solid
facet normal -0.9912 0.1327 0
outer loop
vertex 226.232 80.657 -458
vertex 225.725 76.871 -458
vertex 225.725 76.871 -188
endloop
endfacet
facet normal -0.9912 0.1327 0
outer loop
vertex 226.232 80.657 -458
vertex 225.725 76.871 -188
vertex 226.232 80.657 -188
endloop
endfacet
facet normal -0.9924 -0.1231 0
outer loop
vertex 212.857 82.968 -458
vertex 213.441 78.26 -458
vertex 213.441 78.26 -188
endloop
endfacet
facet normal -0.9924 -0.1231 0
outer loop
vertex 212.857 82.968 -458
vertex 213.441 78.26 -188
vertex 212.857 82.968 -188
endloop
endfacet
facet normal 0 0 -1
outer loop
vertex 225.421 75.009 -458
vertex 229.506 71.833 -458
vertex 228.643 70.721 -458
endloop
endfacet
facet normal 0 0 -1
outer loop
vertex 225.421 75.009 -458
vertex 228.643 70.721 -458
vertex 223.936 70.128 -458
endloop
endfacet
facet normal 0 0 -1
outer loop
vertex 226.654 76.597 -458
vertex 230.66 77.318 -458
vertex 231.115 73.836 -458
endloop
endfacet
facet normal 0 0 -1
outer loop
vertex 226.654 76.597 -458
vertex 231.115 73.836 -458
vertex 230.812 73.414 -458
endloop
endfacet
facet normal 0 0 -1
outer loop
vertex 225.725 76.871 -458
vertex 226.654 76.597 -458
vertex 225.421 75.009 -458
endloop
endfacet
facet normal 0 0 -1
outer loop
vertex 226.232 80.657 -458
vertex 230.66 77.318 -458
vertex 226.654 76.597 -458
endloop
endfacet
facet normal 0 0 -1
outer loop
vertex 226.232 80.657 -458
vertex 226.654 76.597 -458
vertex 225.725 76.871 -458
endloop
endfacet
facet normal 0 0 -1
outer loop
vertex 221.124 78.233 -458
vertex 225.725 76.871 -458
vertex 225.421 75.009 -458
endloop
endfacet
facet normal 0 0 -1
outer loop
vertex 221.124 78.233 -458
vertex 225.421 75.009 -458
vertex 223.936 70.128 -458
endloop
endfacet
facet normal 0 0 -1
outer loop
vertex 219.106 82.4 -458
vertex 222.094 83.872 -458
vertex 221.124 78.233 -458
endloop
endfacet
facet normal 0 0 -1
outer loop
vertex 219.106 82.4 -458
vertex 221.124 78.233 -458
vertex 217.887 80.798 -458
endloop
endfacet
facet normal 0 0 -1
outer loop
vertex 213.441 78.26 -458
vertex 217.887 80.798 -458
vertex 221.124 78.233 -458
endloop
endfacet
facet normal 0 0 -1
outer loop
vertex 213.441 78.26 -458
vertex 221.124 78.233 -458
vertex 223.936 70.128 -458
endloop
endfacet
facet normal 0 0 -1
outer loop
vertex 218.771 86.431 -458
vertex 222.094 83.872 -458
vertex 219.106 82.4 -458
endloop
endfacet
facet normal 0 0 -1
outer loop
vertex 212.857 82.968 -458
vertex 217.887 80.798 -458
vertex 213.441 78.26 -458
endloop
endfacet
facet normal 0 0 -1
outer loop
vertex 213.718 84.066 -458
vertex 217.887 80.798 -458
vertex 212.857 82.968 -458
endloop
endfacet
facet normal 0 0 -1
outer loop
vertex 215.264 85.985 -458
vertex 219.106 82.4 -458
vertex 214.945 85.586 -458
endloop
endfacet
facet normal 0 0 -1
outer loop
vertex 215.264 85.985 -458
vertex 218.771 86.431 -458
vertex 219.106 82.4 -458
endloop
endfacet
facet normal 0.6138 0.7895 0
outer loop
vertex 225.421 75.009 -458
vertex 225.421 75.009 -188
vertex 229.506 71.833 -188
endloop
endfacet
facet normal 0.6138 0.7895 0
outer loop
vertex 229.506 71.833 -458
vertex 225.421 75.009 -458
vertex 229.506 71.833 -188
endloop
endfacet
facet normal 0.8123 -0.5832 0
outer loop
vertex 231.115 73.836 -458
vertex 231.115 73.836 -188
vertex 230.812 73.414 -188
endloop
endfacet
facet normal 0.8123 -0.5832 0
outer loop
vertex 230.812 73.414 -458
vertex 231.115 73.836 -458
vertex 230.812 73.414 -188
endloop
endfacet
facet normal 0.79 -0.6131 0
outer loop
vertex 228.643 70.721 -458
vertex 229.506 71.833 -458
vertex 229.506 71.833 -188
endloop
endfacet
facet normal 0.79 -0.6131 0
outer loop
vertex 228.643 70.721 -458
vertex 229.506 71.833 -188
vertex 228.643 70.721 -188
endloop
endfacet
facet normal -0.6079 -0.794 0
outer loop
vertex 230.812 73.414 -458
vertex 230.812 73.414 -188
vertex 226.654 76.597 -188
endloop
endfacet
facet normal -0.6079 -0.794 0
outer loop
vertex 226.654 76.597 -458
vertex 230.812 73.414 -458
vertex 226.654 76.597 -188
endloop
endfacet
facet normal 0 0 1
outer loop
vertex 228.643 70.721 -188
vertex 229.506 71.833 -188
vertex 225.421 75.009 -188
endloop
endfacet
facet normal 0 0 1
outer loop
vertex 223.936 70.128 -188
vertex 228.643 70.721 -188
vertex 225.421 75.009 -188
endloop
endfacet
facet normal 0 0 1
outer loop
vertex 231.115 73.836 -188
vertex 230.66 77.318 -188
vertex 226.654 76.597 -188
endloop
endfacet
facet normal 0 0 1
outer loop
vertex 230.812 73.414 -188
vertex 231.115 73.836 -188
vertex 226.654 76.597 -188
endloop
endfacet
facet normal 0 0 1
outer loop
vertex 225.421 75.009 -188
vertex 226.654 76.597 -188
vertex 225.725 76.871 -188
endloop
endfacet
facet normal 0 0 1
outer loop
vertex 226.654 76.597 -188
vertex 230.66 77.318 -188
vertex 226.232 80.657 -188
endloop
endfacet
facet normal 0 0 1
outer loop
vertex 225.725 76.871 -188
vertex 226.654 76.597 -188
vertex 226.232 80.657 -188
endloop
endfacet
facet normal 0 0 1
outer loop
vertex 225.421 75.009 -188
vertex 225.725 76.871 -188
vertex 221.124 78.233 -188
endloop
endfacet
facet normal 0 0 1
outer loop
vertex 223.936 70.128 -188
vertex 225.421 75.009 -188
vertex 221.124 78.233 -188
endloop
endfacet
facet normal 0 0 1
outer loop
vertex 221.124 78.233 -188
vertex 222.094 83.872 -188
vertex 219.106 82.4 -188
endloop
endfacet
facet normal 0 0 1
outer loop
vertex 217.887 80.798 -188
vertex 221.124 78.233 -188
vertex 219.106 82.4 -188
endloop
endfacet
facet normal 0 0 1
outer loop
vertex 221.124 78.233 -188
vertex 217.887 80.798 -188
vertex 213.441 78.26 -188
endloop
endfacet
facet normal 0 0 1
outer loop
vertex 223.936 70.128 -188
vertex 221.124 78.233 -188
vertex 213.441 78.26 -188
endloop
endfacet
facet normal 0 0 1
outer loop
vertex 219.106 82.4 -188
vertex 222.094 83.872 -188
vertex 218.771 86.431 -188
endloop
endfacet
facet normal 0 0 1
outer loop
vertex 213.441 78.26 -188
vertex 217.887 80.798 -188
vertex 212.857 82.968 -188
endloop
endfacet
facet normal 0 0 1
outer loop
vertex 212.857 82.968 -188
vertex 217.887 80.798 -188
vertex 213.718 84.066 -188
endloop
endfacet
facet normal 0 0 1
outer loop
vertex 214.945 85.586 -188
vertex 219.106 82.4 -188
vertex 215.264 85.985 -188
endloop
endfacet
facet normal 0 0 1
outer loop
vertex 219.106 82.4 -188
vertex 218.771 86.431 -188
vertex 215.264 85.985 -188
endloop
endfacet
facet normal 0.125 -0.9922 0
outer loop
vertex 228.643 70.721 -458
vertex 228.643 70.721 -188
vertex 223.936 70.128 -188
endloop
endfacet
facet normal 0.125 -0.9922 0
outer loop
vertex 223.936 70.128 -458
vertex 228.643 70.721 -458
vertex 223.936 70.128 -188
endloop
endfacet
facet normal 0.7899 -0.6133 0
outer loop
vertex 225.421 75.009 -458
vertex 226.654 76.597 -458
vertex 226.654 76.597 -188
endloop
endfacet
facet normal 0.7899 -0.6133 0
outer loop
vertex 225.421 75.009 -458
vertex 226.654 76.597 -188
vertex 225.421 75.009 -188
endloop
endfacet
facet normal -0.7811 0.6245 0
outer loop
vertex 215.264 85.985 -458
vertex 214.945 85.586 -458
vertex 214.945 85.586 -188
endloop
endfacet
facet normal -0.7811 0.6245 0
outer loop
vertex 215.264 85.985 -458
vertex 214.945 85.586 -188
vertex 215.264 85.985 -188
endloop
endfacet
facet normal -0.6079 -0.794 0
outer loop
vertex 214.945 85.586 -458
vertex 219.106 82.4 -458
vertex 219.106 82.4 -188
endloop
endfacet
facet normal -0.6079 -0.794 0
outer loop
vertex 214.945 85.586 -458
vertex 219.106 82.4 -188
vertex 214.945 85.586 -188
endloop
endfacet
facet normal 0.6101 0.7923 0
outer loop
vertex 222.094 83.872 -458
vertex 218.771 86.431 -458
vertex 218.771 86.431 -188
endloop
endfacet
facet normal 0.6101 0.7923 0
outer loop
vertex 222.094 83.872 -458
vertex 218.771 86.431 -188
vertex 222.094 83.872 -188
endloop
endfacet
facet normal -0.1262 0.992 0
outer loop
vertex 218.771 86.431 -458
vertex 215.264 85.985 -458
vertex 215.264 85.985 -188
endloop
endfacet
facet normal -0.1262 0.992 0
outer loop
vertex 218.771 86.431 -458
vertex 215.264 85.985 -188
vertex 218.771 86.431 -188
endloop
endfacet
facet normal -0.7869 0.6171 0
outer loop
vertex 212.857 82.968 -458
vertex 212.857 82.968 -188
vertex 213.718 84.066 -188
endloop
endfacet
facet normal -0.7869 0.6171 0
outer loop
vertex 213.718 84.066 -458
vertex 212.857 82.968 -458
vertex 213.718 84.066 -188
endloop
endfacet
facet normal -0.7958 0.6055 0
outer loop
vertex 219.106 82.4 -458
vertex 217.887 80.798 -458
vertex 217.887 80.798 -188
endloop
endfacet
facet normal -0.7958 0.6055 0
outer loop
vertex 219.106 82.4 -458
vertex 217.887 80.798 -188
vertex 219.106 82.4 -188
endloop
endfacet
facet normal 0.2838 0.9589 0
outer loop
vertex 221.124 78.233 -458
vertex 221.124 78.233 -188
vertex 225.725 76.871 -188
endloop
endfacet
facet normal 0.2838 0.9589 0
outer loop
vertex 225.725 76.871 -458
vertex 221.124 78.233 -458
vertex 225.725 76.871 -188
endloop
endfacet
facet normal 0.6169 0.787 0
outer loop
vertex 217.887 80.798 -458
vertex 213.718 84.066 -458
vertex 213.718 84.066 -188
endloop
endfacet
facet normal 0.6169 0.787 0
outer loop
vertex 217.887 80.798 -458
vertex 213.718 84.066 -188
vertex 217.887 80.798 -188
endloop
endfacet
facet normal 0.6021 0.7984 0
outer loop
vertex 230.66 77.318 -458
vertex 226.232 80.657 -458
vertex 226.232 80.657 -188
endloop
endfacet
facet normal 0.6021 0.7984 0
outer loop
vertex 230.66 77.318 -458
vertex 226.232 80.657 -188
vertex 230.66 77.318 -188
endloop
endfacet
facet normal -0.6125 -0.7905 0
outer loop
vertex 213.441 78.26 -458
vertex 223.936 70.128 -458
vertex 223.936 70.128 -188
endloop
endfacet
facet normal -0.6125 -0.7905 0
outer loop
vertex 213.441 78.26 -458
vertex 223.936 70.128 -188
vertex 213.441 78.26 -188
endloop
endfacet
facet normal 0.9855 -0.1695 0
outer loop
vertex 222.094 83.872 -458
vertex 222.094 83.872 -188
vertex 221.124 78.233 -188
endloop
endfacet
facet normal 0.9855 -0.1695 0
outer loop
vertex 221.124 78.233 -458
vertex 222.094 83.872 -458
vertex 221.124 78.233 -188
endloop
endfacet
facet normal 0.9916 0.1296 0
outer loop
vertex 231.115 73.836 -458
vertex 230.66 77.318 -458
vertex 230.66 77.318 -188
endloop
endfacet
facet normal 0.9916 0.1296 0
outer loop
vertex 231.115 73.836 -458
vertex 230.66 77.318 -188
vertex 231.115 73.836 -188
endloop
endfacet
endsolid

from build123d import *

# Parameters (mm, degrees)
PAD_DEPTH = 270


with BuildPart() as part:
    # Sketch → Pad (new body)
    with BuildSketch(Plane.XY.offset(-458)):
        Polygon((212.856822, 82.967677), (213.717545, 84.06579), (217.886719, 80.797905), (219.106384, 82.400215), (214.944962, 85.586205), (215.26384, 85.984787), (218.771362, 86.431206), (222.094493, 83.872208), (221.12439, 78.232742), (225.725278, 76.87084), (226.231842, 80.657478), (230.660202, 77.31823), (231.115021, 73.836044), (230.812088, 73.413544), (226.654388, 76.597336), (225.42131, 75.008892), (229.506458, 71.832669), (228.64251, 70.721488), (223.935706, 70.128285), (213.440788, 78.259719), align=None)
    extrude(amount=PAD_DEPTH)


solid = part.part
